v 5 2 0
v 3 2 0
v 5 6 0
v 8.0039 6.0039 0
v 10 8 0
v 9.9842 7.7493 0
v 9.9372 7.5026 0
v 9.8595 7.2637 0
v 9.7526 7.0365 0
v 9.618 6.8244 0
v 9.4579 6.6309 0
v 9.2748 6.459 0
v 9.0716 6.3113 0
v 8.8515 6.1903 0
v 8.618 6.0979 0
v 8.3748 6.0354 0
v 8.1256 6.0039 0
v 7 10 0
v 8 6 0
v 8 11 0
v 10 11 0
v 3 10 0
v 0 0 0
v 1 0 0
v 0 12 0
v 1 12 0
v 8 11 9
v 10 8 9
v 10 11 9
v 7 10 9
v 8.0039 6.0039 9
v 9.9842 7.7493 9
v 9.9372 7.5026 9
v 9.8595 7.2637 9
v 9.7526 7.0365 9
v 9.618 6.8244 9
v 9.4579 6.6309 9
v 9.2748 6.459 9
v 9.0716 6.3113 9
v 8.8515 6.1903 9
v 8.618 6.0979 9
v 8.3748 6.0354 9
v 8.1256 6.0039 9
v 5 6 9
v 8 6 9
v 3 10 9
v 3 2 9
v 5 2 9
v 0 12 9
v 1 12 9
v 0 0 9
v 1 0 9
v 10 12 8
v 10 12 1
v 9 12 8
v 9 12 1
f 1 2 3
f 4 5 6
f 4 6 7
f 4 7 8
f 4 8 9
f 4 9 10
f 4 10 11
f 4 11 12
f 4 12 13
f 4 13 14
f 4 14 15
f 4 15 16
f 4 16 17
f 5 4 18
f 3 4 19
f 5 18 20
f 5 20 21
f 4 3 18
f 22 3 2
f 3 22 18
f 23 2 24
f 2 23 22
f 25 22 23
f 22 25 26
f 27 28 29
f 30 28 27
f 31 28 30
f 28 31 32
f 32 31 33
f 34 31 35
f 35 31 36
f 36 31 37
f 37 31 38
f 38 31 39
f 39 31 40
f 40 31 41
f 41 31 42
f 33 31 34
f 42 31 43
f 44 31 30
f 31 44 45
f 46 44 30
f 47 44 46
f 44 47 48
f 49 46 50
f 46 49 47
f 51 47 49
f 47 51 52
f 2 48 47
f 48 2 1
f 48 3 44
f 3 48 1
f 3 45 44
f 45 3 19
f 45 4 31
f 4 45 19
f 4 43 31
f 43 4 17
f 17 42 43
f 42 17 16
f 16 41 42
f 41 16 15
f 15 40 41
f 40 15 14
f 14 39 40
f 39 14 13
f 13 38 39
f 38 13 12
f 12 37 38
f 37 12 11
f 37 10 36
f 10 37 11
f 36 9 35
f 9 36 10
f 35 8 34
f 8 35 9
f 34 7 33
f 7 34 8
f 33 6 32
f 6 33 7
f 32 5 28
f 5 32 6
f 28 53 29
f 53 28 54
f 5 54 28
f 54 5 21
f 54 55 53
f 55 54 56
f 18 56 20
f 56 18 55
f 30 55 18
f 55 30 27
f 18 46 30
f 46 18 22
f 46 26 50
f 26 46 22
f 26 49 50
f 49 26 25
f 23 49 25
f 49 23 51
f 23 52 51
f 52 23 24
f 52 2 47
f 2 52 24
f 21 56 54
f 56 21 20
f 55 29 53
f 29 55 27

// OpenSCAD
module spoolmount_hook() {
    difference() {
        // Hook body
        linear_extrude(9) {
            polygon(points=[
                [0, 0],
                [0, 12],
                [1, 12],
                [3, 10],
                [7, 10],
                [9, 12],
                [10, 12],
                [10, 8],
                [8, 6],
                [5, 6],
                [5, 2],
                [3, 2],
                [1, 0],
            ]);

            translate([8, 8])
            circle(r=2, $fn=50);
        }

        // Corner cutouts
        {
            translate([9, 10.5, -0.5])
            rotate([90, 0, 90])
            linear_extrude(3, center=true)
            polygon(points=[
                [0, 0],
                [2, 0],
                [2, 2],
            ]);

            translate([9, 10.5, 9.5])
            rotate([-90, 0, 90])
            linear_extrude(3, center=true)
            polygon(points=[
                [0, 0],
                [2, 0],
                [2, 2],
            ]);
        }
    }
}

spoolmount_hook();
